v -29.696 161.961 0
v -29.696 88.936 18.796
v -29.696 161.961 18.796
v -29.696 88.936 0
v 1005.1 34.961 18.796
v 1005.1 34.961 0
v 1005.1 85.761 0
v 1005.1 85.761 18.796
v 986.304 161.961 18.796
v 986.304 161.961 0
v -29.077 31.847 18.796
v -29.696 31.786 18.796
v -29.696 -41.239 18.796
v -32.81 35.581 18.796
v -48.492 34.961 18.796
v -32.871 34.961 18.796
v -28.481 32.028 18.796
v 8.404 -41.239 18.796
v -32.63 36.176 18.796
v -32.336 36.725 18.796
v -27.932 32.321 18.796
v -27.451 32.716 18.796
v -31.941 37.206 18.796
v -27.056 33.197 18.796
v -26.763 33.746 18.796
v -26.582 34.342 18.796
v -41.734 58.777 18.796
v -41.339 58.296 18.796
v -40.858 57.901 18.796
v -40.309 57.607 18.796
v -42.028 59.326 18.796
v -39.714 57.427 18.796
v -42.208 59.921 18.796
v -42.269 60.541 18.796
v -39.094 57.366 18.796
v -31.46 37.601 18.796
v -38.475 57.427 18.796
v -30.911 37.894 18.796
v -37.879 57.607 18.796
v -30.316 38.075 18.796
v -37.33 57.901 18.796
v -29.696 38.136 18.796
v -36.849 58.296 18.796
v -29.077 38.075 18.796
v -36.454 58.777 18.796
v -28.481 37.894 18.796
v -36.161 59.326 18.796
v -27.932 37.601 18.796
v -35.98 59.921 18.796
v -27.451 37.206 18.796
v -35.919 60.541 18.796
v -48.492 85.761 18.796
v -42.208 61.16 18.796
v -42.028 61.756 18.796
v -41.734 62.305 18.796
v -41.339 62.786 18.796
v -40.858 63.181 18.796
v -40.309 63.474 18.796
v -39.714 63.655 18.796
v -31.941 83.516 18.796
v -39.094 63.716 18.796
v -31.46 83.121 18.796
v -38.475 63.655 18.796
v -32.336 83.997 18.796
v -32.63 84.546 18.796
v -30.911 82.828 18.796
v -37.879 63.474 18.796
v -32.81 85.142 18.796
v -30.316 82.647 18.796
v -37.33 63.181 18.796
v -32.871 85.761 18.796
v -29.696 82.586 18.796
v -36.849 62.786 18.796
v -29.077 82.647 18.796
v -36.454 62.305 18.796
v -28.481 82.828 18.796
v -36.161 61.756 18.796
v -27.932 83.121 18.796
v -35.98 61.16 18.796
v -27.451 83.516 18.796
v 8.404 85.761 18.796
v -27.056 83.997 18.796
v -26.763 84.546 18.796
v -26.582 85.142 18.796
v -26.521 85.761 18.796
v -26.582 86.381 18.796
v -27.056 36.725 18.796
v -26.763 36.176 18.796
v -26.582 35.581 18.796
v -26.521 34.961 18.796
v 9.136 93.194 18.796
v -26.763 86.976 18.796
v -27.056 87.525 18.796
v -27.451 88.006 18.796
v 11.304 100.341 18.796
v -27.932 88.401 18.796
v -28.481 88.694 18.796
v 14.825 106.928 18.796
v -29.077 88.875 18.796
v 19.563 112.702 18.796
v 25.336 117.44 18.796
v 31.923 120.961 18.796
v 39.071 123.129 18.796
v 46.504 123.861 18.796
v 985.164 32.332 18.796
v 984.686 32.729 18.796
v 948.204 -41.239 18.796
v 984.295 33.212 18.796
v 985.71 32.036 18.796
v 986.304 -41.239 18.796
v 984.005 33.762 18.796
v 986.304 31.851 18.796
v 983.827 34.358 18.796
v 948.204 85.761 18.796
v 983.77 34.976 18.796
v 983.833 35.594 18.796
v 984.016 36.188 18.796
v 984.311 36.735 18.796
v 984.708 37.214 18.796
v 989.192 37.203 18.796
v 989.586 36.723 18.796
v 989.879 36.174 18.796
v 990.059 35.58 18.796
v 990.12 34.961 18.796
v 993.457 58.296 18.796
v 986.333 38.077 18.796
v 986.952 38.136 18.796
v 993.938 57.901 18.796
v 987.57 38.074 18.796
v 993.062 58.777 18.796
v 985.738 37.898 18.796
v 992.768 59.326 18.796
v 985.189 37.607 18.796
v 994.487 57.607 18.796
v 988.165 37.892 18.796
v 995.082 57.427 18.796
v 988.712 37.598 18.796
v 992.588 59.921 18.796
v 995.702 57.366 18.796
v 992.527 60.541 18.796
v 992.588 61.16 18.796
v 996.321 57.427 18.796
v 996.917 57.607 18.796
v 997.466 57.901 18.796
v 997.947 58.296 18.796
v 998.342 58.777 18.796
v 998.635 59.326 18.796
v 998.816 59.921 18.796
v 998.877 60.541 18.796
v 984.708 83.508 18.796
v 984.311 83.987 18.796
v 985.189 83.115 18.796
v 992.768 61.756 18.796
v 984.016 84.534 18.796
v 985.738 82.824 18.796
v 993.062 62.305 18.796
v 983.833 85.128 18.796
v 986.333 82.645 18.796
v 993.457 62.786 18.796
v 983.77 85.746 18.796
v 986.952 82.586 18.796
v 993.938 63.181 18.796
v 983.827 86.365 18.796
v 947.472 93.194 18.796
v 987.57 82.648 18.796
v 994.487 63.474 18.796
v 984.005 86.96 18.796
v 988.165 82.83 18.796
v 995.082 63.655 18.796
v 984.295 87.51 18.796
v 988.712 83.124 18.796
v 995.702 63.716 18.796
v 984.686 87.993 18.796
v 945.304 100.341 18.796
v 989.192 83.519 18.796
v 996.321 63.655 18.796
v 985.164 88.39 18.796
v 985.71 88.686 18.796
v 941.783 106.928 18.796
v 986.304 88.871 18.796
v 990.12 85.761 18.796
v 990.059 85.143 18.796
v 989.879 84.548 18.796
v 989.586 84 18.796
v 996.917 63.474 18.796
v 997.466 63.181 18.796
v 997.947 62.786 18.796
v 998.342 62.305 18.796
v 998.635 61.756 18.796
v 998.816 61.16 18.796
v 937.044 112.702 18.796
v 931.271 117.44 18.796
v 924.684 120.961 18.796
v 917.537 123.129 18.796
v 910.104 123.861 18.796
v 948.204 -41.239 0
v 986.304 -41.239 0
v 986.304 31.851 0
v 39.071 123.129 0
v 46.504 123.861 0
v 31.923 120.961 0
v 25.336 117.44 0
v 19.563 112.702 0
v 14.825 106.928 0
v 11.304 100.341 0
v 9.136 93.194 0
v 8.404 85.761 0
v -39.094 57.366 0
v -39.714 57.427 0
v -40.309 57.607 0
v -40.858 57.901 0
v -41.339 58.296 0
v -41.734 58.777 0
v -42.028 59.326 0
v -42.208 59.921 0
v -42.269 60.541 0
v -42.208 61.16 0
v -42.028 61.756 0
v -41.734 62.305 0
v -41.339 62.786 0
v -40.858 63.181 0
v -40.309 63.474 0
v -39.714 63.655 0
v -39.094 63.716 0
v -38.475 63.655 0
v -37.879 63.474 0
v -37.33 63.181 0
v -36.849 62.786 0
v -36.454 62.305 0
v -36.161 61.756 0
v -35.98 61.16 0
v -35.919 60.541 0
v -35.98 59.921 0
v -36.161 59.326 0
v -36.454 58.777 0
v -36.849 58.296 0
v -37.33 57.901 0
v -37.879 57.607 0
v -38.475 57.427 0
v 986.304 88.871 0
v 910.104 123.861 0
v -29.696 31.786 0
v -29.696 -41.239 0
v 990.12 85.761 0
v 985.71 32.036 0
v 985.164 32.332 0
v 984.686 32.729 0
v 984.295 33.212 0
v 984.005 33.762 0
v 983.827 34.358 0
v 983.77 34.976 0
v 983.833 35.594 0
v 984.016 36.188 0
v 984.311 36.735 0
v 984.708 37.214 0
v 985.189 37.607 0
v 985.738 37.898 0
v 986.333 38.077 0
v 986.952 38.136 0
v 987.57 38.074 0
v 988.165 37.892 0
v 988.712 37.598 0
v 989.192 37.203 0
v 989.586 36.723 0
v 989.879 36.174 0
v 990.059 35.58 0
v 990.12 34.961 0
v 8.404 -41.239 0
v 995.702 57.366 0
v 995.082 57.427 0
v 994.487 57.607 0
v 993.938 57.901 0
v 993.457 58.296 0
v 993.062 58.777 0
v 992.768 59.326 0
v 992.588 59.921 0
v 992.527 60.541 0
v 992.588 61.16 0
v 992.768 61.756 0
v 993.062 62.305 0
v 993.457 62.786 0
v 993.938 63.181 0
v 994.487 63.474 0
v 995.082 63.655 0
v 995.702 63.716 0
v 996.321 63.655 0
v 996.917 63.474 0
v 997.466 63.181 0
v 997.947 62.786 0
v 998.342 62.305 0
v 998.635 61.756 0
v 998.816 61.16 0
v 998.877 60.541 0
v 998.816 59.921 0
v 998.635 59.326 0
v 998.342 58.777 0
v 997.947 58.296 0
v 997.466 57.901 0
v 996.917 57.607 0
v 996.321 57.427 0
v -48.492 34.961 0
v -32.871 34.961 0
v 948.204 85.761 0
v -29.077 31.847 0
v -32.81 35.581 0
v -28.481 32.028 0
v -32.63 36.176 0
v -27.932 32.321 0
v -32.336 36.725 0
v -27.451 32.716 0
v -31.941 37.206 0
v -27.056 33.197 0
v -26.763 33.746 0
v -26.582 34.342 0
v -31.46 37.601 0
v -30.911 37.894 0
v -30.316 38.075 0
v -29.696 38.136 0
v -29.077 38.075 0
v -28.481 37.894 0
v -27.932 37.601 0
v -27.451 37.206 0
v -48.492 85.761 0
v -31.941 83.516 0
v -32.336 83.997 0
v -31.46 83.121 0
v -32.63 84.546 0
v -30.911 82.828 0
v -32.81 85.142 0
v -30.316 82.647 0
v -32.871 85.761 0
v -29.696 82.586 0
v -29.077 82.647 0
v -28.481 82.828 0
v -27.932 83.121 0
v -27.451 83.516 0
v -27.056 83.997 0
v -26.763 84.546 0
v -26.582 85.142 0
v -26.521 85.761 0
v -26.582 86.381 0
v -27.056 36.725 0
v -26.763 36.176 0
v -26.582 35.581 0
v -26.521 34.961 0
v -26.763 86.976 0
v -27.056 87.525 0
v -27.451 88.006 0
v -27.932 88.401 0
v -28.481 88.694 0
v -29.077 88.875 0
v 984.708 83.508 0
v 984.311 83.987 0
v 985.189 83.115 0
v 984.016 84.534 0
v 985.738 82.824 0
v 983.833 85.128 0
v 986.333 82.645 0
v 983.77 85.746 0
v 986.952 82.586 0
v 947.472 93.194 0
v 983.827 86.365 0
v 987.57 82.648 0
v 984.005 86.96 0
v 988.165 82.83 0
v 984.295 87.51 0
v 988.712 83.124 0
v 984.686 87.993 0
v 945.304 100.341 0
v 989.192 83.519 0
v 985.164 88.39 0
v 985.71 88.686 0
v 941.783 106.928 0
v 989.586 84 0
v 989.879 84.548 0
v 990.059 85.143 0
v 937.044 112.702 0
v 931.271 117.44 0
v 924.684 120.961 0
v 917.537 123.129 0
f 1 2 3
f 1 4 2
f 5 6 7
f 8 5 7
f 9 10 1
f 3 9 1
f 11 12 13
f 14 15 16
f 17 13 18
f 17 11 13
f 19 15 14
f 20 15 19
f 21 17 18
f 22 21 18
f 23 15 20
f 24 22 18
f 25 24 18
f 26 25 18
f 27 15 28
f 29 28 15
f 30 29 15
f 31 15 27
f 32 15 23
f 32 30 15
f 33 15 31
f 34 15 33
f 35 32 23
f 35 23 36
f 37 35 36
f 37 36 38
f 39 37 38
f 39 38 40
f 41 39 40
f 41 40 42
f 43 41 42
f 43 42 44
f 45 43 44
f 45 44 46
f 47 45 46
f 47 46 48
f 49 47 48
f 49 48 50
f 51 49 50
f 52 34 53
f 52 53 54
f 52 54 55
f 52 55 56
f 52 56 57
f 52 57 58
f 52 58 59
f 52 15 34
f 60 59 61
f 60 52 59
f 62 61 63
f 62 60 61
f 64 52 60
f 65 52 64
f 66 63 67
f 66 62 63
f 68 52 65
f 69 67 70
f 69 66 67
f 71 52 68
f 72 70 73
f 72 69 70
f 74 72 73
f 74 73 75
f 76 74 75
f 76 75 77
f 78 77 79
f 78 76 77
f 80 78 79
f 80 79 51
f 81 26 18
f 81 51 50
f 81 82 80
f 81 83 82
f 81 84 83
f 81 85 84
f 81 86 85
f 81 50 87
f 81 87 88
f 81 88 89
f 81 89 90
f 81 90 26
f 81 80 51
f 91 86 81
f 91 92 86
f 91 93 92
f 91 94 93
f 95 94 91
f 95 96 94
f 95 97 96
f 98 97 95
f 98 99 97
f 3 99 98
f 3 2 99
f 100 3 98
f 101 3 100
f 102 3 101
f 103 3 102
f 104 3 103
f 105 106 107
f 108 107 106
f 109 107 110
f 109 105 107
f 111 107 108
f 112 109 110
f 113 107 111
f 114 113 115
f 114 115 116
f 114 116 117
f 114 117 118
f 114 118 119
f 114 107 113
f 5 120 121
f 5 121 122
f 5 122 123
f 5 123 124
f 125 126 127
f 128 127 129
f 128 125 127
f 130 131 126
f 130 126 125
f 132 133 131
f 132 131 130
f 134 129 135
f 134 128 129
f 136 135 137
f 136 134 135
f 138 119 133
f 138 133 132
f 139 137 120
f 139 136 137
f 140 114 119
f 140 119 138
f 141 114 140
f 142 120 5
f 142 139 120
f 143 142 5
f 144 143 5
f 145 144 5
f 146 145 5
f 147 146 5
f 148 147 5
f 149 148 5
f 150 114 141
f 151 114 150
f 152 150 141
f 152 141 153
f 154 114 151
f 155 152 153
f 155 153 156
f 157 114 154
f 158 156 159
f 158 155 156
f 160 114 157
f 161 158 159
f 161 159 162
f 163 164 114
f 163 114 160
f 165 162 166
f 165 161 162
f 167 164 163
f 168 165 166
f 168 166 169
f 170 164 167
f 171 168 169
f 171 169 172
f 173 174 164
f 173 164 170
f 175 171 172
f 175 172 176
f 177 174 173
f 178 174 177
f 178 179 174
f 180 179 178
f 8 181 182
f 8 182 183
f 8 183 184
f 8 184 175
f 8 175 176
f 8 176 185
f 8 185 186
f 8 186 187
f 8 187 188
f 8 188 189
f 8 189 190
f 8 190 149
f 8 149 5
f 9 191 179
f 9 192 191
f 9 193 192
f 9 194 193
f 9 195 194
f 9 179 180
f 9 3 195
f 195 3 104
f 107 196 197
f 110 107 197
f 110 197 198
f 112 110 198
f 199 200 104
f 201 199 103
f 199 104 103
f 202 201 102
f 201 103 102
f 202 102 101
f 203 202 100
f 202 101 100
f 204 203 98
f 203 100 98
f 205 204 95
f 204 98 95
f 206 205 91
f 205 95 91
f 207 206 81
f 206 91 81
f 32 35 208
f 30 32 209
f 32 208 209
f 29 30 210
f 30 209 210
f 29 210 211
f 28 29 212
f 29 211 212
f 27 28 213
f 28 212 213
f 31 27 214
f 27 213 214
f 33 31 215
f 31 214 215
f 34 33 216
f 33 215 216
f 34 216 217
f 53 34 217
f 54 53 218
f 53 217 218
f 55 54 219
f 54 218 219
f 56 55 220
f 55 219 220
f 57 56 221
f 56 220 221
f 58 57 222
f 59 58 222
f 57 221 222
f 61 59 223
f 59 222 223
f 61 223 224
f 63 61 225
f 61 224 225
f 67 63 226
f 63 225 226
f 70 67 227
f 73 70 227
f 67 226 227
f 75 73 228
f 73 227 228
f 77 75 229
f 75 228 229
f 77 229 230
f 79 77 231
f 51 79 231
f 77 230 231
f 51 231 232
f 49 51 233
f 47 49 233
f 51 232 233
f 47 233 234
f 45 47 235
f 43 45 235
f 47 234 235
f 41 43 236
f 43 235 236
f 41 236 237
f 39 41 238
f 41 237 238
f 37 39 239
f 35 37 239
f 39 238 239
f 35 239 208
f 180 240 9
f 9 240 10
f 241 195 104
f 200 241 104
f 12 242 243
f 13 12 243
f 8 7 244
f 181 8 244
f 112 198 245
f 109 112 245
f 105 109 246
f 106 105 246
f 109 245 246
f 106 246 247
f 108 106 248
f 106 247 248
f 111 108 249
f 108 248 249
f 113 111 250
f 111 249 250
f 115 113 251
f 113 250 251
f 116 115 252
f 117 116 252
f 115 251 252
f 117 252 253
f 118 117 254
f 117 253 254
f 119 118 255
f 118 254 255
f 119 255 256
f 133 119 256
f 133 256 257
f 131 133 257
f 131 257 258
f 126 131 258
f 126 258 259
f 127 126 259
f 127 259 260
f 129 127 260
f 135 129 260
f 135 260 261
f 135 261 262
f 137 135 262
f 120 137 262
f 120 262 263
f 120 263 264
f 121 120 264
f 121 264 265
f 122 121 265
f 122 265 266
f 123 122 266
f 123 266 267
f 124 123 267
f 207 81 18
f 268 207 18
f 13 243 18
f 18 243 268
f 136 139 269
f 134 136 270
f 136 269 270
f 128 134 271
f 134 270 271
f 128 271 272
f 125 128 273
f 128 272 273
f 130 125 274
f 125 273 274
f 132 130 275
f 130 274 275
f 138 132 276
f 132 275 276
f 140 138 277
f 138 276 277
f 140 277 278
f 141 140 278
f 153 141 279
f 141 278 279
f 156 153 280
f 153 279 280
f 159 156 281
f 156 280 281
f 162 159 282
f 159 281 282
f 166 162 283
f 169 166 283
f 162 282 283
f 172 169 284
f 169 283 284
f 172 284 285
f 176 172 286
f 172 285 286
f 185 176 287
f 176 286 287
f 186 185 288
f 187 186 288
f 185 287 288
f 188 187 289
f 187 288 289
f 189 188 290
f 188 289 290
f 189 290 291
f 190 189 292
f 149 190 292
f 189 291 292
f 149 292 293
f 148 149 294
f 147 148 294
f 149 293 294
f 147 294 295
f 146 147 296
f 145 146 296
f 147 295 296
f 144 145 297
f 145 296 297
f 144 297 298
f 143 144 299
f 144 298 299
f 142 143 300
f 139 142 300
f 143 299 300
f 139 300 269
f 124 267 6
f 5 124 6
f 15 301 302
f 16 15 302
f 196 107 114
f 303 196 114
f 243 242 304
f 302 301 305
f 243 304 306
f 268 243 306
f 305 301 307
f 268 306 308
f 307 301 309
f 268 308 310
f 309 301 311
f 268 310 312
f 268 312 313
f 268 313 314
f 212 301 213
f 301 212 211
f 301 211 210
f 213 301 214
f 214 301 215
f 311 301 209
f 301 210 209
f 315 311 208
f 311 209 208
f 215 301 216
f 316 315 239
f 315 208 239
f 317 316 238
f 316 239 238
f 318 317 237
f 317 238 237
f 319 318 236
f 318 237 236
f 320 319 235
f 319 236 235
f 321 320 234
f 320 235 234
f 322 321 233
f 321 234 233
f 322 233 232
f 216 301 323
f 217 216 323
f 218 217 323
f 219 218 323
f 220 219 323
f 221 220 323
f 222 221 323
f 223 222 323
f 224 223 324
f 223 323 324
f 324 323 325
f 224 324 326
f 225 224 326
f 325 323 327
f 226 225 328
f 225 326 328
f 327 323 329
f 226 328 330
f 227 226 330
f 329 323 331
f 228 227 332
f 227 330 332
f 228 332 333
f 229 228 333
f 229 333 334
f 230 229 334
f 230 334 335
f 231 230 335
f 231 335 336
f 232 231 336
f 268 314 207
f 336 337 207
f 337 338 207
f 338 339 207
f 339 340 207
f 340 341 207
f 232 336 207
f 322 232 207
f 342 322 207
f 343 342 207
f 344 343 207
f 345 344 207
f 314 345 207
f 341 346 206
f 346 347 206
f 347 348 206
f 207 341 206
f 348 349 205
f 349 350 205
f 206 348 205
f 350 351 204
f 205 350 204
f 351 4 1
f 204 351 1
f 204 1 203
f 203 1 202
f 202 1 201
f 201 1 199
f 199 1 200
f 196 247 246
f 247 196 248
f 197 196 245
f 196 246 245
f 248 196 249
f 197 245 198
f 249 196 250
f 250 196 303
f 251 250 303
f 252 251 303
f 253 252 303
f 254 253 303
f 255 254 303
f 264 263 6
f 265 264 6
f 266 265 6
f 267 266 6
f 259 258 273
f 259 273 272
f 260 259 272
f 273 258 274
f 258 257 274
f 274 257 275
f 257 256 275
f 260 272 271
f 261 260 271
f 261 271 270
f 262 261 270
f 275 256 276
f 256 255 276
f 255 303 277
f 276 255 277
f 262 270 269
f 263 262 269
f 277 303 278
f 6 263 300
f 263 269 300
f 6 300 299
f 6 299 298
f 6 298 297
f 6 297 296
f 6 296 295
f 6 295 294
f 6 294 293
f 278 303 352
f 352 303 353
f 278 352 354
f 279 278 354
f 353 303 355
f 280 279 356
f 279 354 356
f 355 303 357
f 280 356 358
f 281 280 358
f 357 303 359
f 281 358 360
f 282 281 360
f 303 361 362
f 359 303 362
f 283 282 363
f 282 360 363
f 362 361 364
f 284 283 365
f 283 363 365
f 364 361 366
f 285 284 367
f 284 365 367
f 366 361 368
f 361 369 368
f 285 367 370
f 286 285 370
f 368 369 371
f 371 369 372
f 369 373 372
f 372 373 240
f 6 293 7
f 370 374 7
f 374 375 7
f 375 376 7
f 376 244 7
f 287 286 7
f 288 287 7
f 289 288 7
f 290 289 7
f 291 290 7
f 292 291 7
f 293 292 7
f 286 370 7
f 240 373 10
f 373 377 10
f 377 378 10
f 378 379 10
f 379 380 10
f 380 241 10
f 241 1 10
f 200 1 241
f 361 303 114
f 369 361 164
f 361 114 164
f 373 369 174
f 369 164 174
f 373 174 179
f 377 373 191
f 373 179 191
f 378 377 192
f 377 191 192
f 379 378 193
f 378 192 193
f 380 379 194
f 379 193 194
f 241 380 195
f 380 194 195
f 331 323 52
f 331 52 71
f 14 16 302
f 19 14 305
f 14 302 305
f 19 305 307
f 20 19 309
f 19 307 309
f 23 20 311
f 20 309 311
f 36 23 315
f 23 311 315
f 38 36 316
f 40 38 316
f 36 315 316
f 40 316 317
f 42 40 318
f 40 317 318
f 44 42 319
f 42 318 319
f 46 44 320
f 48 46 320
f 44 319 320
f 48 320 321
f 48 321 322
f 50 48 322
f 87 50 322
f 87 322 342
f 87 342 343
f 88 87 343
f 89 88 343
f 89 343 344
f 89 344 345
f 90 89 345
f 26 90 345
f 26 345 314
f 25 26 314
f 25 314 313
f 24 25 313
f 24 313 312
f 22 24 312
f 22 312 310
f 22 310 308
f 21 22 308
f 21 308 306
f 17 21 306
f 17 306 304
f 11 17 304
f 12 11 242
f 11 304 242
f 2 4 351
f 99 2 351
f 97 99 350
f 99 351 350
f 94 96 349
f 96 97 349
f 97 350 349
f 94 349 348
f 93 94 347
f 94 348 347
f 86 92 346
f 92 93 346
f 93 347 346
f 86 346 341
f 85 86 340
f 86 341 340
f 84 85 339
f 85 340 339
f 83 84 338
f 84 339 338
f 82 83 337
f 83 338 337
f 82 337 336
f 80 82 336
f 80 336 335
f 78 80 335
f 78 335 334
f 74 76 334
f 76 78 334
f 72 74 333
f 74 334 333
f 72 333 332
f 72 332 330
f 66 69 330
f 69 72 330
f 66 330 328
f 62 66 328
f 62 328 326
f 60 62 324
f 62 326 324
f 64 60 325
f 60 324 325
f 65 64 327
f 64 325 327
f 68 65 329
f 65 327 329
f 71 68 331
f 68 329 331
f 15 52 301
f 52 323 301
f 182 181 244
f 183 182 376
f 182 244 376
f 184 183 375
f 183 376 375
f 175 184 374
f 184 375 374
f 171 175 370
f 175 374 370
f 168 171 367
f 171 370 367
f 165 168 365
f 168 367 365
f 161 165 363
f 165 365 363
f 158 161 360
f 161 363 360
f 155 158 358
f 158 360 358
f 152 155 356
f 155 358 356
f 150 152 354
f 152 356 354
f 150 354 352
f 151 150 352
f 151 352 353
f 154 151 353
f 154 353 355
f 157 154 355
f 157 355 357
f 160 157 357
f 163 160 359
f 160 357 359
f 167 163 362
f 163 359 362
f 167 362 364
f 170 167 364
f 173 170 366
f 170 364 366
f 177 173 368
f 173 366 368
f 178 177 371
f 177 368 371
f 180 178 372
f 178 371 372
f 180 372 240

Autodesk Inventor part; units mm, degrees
ref_plane "YZ Plane" through (0, 0, 0) normal (1, 0, 0) x (0, 1, 0)
ref_plane "XZ Plane" through (0, 0, 0) normal (0, 1, 0) x (-1, 0, 0)
ref_plane "XY Plane" through (0, 0, 0) normal (0, 0, 1) x (1, 0, 0)
sketch "Sketch1" plane through (0, 0, 0) normal (0, 0, 1) x (1, 0, 0)
  line L0 (-48.4923, 85.7611) -> (-48.4923, 34.9611)
  line L1 (-48.4923, 34.9611) -> (-29.6963, 34.9611)
  line L2 (-29.6963, 34.9611) -> (-29.6963, -41.2389)
  line L3 (-29.6963, -41.2389) -> (986.3037, -41.2389)
  line L4 (986.3037, -41.2389) -> (986.3037, 34.9611)
  line L5 (986.3037, 34.9611) -> (1005.0997, 34.9611)
  line L6 (1005.0997, 34.9611) -> (1005.0997, 85.7611)
  line L7 (1005.0997, 85.7611) -> (986.3037, 85.7611)
  line L8 (986.3037, 85.7611) -> (986.3037, 161.9611)
  line L9 (986.3037, 161.9611) -> (-29.6963, 161.9611)
  line L10 (-48.4923, 85.7611) -> (-29.6963, 85.7611)
  line L11 (-29.6963, 85.7611) -> (-29.6963, 161.9611)
  point P0 (0, 0)
  dimension "d0" = 50.8
  dimension "d1" = 18.796
  dimension "d2" = 76.2
  dimension "d3" = 1016
  dimension "d4" = 76.2
  dimension "d5" = 18.796
  dimension "d6" = 50.8
  dimension "d7" = 76.2
  dimension "d8" = 18.796
extrude "Extrusion1" add sketch "Sketch1" along normal blind 18.796
sketch "Sketch2" plane through (0, 0, 18.796) normal (0, 0, 1) x (1, 0, 0)
  line L0 (-29.6963, 85.7611) -> (-48.4923, 85.7611) projected
  line L1 (-48.4923, 34.9611) -> (-29.6963, 34.9611) projected
  line L2 (1005.0997, 34.9611) -> (1005.0997, 85.7611) projected
  line L3 (-48.4923, 85.7611) -> (-48.4923, 34.9611) projected
  point P0 (0, 0)
  point P1 (-39.0943, 60.5407)
  point P2 (986.9445, 85.7611)
  point P3 (986.9445, 34.9611)
  point P4 (995.7017, 60.5407)
  dimension "d11" = 9.398
  dimension "d12" = 9.398
hole "Hole1" at (-29.6963, 85.7611, 18.796) at (-29.6963, 34.9611, 18.796) at (-39.0943, 60.5407, 18.796) at (986.9445, 85.7611, 18.796) at (986.9445, 34.9611, 18.796) at (995.7017, 60.5407, 18.796) direction (0, 0, -1) diameter 6.35 end through all
sketch "Sketch3" plane through (0, 0, 18.796) normal (0, 0, 1) x (1, 0, 0)
  line L0 (-29.6963, -41.2389) -> (986.3037, -41.2389) projected
  line L1 (8.4037, -41.2389) -> (948.2037, -41.2389)
  line L2 (948.2037, -41.2389) -> (948.2037, 85.7611)
  line L3 (910.1037, 123.8611) -> (46.5037, 123.8611)
  line L4 (8.4037, 85.7611) -> (8.4037, -41.2389)
  line L5 (-29.6963, 31.7861) -> (-29.6963, -41.2389) projected
  line L6 (986.3037, -41.2389) -> (986.3037, 31.8515) projected
  arc A0 (11.5787, 123.8611) -> (8.4037, 120.6861) centre (11.5787, 120.6861) ccw
  arc A1 (46.5037, 123.8611) -> (8.4037, 85.7611) centre (46.5037, 85.7611) ccw
  arc A2 (948.2037, 85.7611) -> (910.1037, 123.8611) centre (910.1037, 85.7611) ccw
  point P0 (0, 0)
  point P1 (948.2037, 123.8611)
  point P2 (8.4037, 123.8611)
  dimension "d20" = 38.1
  dimension "d21" = 38.1
  dimension "d22" = 939.8
  dimension "d23" = 165.1
  dimension "d24" = 3.175
  dimension "d25" = 38.1
extrude "Extrusion2" cut sketch "Sketch3" against normal blind 25.4
properties part number "bottom" material "Wood (Birch)"
